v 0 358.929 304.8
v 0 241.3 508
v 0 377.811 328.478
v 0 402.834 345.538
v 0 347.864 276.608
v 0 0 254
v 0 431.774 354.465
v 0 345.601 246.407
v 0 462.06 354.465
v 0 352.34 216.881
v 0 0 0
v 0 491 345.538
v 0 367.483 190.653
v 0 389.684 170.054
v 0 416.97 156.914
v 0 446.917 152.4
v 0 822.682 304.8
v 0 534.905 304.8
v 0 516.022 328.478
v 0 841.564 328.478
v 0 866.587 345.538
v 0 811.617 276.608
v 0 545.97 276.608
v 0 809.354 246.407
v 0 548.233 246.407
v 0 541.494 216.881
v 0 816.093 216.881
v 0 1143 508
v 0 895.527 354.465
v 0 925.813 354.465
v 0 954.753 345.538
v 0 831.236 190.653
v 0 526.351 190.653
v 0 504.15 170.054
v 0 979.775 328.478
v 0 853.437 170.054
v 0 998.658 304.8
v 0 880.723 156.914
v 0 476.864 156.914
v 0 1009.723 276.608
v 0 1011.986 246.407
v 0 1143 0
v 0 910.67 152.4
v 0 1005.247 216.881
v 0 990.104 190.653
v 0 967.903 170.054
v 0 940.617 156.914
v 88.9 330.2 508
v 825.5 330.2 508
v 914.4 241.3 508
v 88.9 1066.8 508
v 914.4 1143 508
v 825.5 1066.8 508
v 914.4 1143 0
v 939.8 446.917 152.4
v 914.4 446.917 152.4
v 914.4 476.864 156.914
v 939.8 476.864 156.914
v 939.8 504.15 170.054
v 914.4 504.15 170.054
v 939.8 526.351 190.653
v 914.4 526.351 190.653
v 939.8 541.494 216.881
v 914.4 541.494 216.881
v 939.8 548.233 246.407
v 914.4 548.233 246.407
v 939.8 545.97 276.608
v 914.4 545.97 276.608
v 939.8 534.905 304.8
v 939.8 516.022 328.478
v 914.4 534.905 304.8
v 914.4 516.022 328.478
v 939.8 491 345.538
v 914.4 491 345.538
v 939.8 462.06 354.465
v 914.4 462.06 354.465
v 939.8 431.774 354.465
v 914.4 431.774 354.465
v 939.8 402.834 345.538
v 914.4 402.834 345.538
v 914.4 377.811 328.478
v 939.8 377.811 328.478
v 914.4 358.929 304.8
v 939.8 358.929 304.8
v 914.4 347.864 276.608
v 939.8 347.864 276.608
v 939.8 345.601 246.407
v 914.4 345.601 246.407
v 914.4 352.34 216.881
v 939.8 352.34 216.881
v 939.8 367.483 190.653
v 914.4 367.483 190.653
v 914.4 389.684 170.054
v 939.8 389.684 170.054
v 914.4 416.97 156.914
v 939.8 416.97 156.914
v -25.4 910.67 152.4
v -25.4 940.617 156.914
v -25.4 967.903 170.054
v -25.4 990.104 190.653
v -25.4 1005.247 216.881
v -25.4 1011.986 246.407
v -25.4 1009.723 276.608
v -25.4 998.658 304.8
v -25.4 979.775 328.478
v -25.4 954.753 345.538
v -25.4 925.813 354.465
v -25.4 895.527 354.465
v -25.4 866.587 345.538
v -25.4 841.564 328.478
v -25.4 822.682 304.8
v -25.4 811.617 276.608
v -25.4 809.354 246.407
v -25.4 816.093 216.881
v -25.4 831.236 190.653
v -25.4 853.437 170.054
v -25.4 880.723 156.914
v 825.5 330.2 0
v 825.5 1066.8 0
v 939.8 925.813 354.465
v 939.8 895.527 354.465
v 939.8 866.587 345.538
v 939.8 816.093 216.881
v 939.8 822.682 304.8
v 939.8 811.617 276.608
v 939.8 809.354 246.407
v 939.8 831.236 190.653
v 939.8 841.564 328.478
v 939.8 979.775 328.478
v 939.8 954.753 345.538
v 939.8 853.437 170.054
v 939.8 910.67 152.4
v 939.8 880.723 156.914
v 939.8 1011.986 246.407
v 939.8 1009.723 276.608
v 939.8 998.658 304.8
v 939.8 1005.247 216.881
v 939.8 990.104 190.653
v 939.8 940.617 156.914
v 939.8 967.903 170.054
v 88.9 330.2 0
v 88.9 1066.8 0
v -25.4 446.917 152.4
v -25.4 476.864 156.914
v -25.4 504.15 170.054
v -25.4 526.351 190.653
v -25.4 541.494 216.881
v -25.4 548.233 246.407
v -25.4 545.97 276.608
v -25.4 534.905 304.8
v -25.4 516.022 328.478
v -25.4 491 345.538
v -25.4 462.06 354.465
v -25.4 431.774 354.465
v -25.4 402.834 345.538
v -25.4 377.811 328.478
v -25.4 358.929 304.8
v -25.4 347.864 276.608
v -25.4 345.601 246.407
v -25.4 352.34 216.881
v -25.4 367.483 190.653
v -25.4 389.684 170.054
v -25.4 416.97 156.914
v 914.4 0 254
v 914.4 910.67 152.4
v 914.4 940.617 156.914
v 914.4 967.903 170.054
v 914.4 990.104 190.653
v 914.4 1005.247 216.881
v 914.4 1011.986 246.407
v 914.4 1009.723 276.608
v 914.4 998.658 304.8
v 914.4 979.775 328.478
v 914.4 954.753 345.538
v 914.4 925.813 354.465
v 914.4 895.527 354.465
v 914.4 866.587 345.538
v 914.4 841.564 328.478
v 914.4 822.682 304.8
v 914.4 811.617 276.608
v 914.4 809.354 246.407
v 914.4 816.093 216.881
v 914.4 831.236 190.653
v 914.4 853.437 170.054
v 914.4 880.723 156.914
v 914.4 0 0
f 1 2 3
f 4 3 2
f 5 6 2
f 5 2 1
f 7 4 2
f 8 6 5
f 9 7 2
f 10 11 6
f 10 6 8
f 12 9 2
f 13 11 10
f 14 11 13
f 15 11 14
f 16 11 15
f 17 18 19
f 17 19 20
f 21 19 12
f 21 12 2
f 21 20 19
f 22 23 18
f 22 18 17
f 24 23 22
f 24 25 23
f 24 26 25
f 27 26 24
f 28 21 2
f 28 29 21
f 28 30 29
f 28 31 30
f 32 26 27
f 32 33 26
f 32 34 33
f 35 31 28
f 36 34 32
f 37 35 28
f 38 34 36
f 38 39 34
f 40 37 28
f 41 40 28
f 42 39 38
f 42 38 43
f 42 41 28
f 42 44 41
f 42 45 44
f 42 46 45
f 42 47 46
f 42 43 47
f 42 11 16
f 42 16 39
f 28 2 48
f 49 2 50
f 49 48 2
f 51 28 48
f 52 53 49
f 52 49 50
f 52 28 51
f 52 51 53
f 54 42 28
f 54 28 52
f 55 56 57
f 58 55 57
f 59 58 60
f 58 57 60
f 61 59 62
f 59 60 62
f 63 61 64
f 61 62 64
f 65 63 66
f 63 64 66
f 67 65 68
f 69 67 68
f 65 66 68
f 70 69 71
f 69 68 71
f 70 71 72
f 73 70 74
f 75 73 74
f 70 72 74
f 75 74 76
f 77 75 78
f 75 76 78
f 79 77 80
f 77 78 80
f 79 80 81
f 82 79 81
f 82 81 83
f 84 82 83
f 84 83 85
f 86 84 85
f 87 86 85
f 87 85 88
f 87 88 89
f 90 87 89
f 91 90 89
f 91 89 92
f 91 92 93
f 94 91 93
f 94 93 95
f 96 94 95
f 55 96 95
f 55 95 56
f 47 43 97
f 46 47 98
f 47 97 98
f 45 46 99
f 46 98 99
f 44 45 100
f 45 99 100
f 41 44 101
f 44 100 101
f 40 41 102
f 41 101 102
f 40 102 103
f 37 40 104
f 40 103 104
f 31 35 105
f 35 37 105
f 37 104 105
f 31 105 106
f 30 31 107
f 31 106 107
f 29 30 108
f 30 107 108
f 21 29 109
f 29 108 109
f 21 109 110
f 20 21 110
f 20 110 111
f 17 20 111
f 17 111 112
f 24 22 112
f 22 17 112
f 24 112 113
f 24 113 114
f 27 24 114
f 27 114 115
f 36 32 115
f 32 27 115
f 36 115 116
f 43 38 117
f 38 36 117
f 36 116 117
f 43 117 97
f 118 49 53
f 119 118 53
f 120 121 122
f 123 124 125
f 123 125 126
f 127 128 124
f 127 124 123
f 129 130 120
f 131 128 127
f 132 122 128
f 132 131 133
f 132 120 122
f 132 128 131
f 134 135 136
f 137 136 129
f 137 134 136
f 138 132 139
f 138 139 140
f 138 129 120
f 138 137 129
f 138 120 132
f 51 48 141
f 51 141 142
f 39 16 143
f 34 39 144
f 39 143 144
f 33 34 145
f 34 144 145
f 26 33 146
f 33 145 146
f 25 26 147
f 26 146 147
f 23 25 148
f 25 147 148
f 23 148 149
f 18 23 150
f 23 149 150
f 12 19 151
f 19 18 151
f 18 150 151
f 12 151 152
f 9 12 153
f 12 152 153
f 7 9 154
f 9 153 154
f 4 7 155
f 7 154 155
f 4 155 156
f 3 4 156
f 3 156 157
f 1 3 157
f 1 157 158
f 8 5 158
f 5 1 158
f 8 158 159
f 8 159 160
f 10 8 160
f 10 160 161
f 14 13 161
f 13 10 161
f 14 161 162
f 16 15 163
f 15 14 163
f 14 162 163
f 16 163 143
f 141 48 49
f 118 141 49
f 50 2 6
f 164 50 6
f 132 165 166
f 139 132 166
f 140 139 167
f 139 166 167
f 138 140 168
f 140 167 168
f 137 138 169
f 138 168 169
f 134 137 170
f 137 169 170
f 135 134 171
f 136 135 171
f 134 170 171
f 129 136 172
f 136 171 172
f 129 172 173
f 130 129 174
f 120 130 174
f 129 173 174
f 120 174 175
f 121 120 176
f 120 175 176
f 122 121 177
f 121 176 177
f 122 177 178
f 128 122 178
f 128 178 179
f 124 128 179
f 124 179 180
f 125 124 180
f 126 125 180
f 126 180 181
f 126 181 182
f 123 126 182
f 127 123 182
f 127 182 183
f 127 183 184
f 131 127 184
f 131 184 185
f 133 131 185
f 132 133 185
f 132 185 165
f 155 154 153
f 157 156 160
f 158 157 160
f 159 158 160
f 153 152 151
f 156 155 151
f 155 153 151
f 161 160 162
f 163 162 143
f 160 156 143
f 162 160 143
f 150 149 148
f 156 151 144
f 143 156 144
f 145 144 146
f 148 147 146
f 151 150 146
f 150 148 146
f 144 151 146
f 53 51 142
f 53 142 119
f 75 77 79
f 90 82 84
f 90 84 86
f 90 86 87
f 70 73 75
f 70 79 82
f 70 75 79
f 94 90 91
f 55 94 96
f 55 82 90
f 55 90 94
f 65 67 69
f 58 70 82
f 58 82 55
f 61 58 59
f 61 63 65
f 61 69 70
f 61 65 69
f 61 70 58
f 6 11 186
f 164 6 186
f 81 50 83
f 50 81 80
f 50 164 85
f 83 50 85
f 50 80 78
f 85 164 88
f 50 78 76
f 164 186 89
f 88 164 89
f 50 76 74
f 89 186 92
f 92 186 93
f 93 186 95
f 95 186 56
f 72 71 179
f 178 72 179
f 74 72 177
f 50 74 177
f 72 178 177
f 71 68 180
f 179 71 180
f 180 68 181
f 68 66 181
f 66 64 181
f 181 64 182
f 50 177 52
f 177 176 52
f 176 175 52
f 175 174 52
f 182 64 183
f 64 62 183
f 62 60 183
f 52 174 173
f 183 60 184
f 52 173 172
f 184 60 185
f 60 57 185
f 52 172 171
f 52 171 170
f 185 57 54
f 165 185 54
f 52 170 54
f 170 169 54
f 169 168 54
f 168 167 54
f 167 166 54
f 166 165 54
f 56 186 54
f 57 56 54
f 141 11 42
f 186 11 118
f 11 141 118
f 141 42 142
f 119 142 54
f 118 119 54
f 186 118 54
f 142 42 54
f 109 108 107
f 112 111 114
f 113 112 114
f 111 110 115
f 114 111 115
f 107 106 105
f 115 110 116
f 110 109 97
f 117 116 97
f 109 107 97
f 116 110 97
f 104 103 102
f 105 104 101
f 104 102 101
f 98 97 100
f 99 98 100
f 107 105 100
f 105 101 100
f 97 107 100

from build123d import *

# Parameters (mm, degrees)
SKETCH2_W                = 914.4
SKETCH2_H                = 1143
BOSS_EXTRUDE1_DEPTH      = 508
CUT_EXTRUDE1_DEPTH       = 1550.4
BOSS_EXTRUDE2_DEPTH      = 25.4
BOSS_EXTRUDE2_DEPTH_BACK = 939.8
SKETCH4_R                = 101.6
CUT_EXTRUDE2_REACH       = 1566.525
SKETCH5_W                = 736.6
SKETCH5_H                = 736.6


with BuildPart() as part:
    # Sketch2 → Boss-Extrude1 (new body)
    with BuildSketch(Plane.XY):
        with Locations((457.2, 571.5)):
            Rectangle(SKETCH2_W, SKETCH2_H)
    extrude(amount=BOSS_EXTRUDE1_DEPTH)

    # Sketch3 → Cut-Extrude1 (cut, through all)
    with BuildSketch(Plane(origin=(914.4, 0, 0), x_dir=(0, 0, -1), z_dir=(1, 0, 0))):
        Polygon((-508, 241.3), (-254, 0), (-508, 0), align=None)
    extrude(amount=-CUT_EXTRUDE1_DEPTH, mode=Mode.SUBTRACT)

    # Sketch4 → Boss-Extrude2 (add, two sides: drawn at the far end of the back side and taken through both)
    with BuildSketch(Plane(origin=(914.4, 0, 0), x_dir=(0, 0, -1), z_dir=(1, 0, 0)).offset(-BOSS_EXTRUDE2_DEPTH_BACK)):
        with Locations((-254, 910.669925226)):
            Circle(SKETCH4_R)
        with Locations((-254, 446.916916509)):
            Circle(SKETCH4_R)
    extrude(amount=BOSS_EXTRUDE2_DEPTH + BOSS_EXTRUDE2_DEPTH_BACK)

    # Sketch5 → Cut-Extrude2 (cut, up to next)
    with BuildSketch(Plane.XY.offset(508), mode=Mode.PRIVATE) as cut_extrude2_sk1:
        with Locations((457.2, 698.5)):
            Rectangle(SKETCH5_W, SKETCH5_H)
    cut_extrude2_tool1 = extrude(cut_extrude2_sk1.sketch, amount=-CUT_EXTRUDE2_REACH, mode=Mode.PRIVATE) & part.part
    add(cut_extrude2_tool1.solids().sort_by_distance((457.2, 698.5, 508))[0], mode=Mode.SUBTRACT)


solid = part.part
